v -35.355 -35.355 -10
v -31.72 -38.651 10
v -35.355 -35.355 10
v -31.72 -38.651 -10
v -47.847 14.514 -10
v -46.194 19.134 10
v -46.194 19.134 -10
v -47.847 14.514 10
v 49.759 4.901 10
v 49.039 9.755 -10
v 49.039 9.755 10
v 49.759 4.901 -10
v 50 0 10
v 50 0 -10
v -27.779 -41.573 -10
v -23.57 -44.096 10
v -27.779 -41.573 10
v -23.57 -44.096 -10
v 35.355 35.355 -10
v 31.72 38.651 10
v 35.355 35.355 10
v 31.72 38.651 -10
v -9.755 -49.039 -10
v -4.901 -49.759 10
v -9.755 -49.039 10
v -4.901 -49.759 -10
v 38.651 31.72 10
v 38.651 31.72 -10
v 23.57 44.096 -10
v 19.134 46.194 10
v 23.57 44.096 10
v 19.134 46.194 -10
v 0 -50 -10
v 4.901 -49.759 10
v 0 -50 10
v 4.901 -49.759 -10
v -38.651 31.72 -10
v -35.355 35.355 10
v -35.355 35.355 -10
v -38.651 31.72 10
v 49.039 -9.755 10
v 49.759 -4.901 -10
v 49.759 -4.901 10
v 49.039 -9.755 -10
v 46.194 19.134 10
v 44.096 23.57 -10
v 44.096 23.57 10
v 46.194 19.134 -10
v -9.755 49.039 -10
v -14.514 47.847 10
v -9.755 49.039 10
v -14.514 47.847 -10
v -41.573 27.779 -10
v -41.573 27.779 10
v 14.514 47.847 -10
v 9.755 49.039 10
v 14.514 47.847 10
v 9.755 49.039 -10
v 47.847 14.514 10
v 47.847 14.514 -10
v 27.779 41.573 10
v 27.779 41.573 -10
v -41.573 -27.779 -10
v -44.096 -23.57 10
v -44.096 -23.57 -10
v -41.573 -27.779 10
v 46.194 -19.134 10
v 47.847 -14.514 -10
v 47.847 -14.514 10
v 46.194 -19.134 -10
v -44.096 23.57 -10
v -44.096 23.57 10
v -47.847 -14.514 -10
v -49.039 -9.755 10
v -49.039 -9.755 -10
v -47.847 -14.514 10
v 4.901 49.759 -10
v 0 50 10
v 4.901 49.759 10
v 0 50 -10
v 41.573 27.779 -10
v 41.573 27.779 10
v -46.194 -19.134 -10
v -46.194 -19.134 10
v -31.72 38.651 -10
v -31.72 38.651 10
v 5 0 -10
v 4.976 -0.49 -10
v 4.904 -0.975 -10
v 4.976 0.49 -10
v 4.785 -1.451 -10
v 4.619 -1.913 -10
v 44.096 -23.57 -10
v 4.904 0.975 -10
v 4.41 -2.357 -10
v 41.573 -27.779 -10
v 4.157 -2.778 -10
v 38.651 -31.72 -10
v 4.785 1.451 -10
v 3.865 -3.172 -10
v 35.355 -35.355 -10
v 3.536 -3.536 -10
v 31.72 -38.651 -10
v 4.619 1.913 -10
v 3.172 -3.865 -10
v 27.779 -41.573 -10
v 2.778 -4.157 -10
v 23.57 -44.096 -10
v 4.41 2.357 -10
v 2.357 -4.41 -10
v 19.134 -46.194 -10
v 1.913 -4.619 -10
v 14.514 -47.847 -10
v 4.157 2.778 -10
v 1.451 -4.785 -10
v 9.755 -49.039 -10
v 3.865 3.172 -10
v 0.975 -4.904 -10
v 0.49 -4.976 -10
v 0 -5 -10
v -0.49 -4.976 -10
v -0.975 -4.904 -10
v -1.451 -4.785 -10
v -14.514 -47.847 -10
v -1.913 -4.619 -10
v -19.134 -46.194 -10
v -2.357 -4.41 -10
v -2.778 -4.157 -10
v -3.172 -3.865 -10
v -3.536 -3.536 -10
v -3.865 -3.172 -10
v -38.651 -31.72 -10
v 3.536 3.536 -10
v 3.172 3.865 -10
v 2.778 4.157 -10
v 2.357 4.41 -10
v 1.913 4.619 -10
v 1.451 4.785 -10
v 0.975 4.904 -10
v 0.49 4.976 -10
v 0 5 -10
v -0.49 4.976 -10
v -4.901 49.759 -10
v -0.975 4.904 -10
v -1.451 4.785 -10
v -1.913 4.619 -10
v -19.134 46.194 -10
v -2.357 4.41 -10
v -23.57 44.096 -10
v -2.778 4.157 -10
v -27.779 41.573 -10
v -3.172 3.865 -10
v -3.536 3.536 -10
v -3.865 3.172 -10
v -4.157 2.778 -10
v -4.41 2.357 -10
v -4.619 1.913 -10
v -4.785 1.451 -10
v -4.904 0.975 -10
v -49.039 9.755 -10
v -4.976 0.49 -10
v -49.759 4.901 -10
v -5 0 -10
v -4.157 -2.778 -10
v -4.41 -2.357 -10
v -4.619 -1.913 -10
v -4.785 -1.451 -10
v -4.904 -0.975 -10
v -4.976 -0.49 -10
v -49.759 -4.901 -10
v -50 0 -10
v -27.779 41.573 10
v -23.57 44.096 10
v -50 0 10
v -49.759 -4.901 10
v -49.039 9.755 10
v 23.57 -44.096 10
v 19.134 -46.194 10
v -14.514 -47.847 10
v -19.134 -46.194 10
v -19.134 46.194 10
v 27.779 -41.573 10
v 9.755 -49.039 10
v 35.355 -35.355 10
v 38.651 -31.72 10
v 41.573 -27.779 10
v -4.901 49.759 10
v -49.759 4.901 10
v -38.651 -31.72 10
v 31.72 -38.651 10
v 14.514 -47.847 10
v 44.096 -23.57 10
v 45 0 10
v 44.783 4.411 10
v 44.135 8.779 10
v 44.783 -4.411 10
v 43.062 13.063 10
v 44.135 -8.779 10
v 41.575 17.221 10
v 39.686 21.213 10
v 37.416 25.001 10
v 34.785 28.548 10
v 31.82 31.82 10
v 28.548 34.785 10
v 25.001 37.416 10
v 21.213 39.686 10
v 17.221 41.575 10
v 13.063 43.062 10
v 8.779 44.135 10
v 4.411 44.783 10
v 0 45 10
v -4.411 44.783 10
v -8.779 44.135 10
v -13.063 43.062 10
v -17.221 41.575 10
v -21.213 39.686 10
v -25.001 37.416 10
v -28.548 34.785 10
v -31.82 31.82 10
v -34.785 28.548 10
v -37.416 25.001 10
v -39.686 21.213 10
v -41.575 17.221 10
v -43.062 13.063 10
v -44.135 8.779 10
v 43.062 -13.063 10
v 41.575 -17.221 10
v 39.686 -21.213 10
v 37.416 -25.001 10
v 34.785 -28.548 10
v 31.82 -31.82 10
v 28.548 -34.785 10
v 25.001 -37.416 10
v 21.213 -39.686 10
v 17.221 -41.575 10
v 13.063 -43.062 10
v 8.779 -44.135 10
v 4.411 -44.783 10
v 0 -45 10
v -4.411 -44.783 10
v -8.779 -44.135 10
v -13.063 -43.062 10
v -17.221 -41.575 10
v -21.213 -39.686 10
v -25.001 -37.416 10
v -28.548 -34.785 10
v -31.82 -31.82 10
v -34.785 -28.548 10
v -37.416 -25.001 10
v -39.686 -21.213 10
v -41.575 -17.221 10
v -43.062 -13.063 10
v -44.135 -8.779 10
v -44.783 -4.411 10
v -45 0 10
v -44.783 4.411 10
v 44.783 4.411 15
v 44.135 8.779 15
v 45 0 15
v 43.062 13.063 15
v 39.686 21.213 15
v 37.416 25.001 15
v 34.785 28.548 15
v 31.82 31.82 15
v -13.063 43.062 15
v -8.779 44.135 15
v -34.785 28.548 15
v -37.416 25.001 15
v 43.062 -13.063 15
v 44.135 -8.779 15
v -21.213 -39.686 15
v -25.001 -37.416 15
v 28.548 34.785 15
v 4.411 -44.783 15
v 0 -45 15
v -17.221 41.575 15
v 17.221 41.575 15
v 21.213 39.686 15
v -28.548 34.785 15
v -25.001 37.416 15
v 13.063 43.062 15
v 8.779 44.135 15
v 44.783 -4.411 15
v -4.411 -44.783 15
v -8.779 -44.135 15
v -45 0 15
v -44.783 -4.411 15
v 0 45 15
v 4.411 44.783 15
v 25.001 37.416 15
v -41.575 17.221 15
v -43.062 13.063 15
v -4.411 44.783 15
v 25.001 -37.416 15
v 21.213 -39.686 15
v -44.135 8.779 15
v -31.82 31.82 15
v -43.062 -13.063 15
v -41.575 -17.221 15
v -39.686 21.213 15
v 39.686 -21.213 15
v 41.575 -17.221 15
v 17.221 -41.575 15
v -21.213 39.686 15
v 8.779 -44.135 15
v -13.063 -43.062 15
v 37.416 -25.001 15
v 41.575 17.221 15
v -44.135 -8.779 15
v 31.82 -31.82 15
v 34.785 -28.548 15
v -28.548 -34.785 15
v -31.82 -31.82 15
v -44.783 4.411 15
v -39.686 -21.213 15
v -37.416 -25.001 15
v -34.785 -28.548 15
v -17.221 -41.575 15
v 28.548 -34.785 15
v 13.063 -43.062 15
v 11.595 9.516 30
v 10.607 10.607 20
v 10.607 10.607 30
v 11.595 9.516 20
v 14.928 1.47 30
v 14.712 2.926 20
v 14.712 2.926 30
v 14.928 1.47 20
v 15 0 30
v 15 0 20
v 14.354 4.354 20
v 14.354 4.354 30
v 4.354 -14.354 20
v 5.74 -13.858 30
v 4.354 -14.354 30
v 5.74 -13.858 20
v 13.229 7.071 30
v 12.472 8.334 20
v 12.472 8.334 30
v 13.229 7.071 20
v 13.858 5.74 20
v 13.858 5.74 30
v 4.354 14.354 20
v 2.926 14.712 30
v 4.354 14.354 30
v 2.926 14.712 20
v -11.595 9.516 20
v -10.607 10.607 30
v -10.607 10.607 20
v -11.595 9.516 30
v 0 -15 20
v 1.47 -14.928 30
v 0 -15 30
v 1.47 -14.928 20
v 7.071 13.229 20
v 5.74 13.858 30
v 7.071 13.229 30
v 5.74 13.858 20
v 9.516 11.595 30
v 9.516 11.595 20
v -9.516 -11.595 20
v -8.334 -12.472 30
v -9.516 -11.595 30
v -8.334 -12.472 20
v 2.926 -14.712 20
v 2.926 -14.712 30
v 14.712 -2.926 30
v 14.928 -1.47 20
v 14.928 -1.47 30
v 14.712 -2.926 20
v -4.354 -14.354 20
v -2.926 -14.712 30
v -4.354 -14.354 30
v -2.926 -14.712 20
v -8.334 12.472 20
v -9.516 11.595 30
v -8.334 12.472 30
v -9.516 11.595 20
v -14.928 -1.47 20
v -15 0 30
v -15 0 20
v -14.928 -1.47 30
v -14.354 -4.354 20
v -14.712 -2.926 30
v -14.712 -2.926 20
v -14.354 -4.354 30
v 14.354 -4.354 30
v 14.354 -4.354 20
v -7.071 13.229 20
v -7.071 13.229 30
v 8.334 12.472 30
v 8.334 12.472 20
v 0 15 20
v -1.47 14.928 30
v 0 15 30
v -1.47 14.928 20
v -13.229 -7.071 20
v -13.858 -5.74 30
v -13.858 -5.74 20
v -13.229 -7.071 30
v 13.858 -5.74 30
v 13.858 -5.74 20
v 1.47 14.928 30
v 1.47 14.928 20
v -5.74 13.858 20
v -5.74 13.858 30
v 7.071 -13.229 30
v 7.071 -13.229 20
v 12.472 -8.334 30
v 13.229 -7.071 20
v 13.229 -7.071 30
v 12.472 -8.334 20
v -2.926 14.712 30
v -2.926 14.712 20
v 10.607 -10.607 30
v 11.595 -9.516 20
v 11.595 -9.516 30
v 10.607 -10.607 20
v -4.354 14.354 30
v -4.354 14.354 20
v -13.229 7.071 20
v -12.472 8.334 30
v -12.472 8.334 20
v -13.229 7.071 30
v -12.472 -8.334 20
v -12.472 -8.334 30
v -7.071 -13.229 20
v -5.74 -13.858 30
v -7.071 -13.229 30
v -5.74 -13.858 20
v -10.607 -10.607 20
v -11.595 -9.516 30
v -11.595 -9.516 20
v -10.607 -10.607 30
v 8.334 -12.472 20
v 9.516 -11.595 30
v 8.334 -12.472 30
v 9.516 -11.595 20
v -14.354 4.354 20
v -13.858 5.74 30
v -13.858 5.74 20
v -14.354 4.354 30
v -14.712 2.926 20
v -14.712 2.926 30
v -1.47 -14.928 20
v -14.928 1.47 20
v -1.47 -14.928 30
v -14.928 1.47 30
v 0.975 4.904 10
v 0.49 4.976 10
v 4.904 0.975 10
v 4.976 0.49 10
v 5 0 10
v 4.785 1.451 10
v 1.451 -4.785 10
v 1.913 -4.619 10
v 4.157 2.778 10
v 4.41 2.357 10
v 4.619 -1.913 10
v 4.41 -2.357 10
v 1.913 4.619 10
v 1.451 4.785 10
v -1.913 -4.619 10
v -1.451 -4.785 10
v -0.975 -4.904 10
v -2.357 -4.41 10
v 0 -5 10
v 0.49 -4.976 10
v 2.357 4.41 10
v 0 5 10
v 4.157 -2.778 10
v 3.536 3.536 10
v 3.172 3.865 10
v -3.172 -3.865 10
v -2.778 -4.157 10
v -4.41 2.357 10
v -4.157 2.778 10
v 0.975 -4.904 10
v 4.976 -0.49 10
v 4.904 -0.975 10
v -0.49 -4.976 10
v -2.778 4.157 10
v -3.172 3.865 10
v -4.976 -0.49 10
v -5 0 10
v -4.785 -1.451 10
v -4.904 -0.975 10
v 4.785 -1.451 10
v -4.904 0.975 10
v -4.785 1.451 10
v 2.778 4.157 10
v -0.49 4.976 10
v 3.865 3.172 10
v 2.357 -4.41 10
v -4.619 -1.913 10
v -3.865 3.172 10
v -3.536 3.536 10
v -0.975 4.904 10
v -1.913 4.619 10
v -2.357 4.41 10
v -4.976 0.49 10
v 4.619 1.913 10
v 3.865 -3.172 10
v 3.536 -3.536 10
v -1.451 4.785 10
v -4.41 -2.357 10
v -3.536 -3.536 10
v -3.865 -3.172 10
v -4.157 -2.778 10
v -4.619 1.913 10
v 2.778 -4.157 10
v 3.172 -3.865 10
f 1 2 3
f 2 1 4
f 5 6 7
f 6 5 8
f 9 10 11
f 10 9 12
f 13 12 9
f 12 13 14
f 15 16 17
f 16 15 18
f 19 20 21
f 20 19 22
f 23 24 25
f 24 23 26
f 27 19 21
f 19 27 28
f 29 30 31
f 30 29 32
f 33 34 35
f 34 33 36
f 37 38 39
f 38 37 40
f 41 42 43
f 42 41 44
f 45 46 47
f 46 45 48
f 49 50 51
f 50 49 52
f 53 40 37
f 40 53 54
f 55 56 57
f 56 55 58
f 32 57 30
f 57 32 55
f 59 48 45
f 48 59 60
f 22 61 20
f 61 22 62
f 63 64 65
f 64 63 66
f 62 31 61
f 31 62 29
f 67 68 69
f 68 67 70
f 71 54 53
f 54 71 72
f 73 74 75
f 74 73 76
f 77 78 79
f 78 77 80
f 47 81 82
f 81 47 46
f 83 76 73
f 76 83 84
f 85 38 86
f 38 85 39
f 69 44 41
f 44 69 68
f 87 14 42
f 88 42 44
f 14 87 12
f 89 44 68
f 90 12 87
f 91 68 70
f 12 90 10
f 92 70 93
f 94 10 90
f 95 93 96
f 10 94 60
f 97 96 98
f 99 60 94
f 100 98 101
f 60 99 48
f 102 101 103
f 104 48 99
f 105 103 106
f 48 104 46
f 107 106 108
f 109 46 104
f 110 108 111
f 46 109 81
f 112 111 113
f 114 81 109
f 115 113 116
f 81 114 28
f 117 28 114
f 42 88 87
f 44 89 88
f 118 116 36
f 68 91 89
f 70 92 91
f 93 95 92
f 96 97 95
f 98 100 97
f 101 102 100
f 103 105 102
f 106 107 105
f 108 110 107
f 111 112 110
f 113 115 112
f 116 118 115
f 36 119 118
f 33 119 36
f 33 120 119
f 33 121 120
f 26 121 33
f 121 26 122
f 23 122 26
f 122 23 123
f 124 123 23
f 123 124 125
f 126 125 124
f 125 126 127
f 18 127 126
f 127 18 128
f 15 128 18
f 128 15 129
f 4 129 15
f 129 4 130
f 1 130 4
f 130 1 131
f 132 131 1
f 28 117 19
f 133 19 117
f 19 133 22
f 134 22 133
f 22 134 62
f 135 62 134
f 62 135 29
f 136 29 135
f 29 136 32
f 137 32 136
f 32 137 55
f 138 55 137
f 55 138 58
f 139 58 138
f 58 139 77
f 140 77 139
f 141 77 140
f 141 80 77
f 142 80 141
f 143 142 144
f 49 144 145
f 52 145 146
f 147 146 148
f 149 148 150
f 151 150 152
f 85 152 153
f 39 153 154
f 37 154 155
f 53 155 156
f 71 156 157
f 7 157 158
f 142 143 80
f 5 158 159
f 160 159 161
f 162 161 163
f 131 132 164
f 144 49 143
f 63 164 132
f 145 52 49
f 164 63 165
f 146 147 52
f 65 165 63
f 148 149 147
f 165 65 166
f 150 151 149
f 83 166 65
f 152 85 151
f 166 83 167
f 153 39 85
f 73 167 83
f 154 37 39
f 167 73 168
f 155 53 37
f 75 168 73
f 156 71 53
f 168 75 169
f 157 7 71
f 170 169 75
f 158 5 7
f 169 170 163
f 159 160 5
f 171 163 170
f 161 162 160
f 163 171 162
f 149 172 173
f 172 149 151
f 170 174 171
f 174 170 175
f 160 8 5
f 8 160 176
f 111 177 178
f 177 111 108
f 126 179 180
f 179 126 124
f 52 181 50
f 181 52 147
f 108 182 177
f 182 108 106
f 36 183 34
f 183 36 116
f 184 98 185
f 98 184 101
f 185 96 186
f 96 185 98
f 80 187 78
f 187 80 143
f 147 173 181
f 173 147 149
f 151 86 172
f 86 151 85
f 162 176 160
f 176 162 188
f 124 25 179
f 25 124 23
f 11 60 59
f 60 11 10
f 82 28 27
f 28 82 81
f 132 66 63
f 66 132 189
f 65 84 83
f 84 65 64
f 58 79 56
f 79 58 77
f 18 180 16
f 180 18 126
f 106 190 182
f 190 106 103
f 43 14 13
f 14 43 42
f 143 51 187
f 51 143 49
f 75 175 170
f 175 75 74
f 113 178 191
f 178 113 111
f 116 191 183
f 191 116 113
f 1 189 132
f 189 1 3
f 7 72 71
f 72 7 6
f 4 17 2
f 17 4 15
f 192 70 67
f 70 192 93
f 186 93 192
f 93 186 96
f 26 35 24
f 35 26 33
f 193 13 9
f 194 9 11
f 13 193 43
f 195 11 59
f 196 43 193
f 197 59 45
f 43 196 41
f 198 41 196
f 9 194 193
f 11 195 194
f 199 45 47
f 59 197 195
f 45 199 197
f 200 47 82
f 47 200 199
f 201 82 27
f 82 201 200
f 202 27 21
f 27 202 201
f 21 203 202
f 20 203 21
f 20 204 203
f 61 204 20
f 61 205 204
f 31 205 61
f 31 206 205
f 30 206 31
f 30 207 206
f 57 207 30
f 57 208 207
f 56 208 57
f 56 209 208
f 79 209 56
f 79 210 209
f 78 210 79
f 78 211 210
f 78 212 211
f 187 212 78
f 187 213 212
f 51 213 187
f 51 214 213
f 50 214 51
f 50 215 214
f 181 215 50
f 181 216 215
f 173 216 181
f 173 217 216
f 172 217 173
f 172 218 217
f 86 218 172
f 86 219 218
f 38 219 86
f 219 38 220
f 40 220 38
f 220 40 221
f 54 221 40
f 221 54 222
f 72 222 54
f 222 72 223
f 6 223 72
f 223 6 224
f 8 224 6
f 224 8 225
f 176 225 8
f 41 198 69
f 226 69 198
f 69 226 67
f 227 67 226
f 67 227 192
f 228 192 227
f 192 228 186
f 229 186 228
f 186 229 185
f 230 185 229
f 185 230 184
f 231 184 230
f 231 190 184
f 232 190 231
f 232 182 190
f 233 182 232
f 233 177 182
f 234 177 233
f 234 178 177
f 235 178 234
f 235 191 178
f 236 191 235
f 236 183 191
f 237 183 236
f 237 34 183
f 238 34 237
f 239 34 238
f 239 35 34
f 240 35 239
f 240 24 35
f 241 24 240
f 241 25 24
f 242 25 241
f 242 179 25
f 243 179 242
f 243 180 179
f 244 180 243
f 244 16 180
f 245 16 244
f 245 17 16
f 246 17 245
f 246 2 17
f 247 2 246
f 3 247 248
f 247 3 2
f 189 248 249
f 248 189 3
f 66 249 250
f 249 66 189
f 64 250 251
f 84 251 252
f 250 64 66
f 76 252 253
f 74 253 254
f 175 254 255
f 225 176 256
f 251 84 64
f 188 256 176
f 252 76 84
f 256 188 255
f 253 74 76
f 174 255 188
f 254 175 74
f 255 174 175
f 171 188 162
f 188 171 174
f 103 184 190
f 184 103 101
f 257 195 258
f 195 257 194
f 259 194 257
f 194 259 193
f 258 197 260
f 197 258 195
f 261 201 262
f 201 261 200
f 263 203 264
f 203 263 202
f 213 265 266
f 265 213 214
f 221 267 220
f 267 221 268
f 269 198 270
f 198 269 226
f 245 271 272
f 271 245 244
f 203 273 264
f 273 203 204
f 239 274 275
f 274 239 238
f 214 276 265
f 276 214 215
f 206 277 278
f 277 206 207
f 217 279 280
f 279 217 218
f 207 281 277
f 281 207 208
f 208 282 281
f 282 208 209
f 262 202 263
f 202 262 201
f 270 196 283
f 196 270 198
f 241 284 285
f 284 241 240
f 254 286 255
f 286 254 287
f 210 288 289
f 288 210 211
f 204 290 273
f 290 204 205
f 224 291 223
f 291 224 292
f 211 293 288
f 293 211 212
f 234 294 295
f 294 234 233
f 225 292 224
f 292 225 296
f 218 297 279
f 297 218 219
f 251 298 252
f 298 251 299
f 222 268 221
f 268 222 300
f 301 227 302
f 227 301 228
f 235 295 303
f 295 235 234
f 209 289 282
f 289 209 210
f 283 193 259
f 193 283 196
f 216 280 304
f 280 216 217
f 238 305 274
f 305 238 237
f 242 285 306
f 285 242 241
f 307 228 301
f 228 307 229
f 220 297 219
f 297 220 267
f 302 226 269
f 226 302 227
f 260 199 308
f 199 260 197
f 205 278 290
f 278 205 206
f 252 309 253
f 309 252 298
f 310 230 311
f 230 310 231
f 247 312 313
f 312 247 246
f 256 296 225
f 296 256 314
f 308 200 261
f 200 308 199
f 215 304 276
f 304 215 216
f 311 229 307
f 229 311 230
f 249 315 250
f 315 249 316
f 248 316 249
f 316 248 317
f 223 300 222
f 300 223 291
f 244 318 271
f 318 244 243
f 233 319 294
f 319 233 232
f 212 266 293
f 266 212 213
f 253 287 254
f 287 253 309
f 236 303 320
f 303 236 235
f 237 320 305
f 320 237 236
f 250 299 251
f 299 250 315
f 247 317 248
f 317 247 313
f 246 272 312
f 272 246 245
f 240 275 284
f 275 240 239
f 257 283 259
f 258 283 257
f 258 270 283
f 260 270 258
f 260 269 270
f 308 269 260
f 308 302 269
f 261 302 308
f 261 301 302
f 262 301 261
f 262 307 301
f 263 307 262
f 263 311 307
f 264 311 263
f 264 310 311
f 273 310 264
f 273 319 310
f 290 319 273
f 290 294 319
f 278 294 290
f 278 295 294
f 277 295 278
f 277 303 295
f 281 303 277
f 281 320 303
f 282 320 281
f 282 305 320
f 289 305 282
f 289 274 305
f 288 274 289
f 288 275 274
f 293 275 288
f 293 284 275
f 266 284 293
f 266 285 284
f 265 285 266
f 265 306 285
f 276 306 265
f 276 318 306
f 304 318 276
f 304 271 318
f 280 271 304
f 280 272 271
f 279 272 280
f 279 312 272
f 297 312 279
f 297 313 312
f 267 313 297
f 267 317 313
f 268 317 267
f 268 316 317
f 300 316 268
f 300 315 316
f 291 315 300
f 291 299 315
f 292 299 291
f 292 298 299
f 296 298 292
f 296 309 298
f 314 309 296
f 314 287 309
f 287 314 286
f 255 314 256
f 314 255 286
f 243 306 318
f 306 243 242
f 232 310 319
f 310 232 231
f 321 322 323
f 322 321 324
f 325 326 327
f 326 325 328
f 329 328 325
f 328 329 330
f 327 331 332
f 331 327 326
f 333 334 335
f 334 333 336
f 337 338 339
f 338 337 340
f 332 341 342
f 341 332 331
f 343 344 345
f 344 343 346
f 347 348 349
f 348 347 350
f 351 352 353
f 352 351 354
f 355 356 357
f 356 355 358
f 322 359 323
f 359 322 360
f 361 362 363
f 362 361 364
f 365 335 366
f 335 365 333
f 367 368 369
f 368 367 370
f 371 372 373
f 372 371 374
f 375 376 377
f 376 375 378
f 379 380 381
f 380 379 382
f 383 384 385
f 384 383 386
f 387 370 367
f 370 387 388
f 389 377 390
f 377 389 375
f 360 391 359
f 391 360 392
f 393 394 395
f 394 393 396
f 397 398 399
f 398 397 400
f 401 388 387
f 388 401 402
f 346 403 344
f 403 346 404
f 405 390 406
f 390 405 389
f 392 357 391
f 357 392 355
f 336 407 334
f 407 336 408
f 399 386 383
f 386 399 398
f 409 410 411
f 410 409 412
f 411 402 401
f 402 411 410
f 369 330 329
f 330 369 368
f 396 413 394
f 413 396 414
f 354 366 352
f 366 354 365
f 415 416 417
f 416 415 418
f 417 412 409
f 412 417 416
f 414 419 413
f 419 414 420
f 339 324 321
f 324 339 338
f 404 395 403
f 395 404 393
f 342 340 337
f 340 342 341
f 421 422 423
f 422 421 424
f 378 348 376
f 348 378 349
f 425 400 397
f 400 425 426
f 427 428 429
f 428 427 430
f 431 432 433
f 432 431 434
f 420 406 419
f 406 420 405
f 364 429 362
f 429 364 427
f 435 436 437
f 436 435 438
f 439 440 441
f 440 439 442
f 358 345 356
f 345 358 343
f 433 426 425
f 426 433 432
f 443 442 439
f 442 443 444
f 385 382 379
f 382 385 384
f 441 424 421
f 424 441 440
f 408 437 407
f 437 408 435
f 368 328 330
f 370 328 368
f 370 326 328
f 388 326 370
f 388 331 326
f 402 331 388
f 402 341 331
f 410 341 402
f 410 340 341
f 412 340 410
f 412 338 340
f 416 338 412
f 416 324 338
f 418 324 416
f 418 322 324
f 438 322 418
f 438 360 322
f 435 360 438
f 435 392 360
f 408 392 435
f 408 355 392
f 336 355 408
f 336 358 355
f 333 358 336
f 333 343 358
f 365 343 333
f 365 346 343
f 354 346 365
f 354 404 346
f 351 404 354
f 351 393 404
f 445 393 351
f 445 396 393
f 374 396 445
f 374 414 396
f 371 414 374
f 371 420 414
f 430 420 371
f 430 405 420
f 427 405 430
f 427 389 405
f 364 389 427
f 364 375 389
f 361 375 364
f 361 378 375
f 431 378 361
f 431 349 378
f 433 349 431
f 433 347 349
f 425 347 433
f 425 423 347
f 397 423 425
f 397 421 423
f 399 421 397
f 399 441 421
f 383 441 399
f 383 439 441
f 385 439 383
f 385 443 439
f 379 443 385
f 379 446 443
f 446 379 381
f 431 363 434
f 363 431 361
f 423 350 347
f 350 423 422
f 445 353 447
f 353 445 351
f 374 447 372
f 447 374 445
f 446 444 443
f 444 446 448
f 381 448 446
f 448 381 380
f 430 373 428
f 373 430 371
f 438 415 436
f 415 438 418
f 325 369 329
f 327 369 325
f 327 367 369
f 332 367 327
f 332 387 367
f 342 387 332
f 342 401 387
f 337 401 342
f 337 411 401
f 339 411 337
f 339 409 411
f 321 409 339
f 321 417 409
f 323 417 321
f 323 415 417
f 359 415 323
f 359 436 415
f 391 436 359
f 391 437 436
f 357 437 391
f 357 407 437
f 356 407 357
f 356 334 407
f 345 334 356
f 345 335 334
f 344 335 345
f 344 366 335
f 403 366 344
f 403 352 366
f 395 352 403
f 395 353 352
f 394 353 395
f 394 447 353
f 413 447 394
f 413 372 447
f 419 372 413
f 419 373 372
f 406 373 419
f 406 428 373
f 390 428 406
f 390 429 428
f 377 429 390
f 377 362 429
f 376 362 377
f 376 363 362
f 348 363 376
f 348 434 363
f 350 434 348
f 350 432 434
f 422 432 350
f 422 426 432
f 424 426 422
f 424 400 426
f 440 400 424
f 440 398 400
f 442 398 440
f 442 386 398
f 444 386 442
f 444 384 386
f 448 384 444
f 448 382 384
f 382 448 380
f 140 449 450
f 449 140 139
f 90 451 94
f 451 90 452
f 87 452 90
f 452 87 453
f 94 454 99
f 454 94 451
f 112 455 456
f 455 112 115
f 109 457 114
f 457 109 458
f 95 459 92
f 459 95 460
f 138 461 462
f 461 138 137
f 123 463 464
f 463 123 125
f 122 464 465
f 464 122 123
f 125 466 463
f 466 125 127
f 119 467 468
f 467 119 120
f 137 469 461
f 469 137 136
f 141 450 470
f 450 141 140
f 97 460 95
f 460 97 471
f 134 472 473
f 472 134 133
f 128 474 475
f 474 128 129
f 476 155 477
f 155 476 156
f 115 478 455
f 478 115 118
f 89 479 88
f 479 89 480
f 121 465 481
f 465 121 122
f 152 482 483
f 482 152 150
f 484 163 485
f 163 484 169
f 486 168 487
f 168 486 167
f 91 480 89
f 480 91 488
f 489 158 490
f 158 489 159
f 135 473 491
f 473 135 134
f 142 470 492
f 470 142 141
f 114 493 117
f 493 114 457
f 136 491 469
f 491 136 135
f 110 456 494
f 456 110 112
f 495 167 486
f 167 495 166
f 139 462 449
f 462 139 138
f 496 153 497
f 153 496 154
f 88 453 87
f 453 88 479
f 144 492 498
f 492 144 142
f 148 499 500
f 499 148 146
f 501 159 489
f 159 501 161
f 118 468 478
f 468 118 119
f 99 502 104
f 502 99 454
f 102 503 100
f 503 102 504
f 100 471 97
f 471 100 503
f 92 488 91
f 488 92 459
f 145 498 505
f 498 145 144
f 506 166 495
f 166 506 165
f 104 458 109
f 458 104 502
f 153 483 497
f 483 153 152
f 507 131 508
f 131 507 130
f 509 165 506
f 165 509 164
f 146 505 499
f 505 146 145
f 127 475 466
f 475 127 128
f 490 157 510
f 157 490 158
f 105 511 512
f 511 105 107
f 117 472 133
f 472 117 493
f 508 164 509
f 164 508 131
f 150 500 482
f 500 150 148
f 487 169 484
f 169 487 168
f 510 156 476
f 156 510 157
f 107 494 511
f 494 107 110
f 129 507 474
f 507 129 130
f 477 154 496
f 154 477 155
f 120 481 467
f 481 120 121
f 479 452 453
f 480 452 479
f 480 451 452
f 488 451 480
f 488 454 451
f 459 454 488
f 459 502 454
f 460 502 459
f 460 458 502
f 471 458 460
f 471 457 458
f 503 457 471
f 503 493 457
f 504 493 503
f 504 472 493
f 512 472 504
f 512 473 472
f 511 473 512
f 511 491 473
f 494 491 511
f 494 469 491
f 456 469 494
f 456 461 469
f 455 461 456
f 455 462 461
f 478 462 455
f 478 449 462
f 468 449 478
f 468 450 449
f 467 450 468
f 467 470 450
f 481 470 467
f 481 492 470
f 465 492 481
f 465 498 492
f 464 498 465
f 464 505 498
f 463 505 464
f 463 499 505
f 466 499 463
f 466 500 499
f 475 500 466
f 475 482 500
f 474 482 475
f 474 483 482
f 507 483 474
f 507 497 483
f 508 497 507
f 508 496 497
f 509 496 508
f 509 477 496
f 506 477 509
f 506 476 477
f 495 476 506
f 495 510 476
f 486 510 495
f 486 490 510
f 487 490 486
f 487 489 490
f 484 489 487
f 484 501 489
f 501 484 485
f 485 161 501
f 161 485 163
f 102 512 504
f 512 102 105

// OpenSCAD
$fn=64;

module variac() {
    difference() {
        union() {
            // Base cylinder
            cylinder(h=20, r=50, center=true);
            
            // Top cylinder
            translate([0, 0, 10])
                cylinder(h=10, r=45, center=true);
            
            // Knob
            translate([0, 0, 25])
                cylinder(h=10, r=15, center=true);
        }
        
        // Central hole
        translate([0, 0, -10])
            cylinder(h=40, r=5, center=true);
    }
}

variac();
